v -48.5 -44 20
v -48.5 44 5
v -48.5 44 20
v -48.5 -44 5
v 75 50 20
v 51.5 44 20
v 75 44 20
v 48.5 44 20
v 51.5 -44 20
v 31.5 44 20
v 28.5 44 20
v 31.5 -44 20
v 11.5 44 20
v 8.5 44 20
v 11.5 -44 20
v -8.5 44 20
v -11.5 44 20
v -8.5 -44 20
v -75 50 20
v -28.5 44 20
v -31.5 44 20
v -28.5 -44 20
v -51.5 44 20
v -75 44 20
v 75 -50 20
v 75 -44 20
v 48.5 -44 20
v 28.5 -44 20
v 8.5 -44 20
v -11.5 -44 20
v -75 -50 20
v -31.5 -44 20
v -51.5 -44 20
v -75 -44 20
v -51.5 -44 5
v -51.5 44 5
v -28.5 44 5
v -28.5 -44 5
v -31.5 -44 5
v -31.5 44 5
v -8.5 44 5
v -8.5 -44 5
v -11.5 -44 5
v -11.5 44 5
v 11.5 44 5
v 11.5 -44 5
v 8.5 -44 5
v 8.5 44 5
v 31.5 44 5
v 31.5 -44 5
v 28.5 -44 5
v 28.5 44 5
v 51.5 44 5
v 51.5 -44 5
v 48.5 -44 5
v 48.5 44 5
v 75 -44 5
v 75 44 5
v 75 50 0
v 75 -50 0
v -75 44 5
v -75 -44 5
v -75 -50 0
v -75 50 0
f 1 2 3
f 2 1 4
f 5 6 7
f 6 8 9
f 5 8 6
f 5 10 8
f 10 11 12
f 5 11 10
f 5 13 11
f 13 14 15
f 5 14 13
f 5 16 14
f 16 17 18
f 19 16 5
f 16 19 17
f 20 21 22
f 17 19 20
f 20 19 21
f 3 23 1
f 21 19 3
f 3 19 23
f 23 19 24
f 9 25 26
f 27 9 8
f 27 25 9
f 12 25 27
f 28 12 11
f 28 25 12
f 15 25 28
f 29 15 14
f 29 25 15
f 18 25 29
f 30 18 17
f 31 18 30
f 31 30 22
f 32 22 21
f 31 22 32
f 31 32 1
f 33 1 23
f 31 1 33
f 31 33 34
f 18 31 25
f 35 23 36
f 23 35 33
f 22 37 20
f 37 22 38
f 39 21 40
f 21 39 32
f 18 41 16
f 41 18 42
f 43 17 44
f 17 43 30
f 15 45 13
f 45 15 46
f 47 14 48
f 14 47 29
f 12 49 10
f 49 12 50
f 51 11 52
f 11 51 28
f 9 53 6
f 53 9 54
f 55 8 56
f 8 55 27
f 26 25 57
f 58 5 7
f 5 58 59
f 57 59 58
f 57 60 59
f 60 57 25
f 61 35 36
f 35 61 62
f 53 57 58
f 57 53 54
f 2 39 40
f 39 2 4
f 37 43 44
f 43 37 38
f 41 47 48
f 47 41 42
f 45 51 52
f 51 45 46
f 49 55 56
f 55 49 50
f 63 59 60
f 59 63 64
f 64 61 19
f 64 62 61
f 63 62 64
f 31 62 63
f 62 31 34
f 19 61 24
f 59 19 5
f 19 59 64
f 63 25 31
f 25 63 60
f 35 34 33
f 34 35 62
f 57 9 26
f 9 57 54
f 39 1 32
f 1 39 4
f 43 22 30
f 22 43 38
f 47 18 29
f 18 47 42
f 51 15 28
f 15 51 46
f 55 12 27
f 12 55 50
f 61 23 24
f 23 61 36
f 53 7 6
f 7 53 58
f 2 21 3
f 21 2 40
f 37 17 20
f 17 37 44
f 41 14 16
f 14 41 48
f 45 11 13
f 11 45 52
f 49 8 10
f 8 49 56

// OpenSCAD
$fn = 32;

// ----------------------------------------------------------------------
// Rib frame 150 x 100 x 20
// 6 ribs at 20 mm pitch
// ----------------------------------------------------------------------

// --- parameters (mm) ---
frame = [150, 100, 5];  // base plate size (x, y, z)
rail_w = 6;             // side rail width
ribs = 6;               // number of ribs
rib_t = 3;              // rib thickness
rib_h = 15;             // rib height above the base plate
pitch = 20;             // pitch between rib centres

// --- derived feature positions (mm) ---
span = (ribs - 1) * pitch;          // = 100   distance between the outer ribs
origin_x = -span / 2;               // = -50   X of the first rib
rib_len = frame[1] - 2 * rail_w + 2;  // = 90   rib length, 1 mm into each rail
feature_centers = [
  [origin_x + 0 * pitch, 0],
  [origin_x + 1 * pitch, 0],
  [origin_x + 2 * pitch, 0],
  [origin_x + 3 * pitch, 0],
  [origin_x + 4 * pitch, 0],
  [origin_x + 5 * pitch, 0]
];   // rib centre line, drives the rib loop

// base plate, two side rails, then the ribs read straight off feature_centers
union() {
  translate([-frame[0] / 2, -frame[1] / 2, 0]) cube(frame);
  translate([-frame[0] / 2, -frame[1] / 2, 0]) cube([frame[0], rail_w, frame[2] + rib_h]);
  translate([-frame[0] / 2, frame[1] / 2 - rail_w, 0]) cube([frame[0], rail_w, frame[2] + rib_h]);
  for (centre = feature_centers)
    translate([centre[0] - rib_t / 2, centre[1] - rib_len / 2, frame[2] - 1])
      cube([rib_t, rib_len, rib_h + 1]);
}
